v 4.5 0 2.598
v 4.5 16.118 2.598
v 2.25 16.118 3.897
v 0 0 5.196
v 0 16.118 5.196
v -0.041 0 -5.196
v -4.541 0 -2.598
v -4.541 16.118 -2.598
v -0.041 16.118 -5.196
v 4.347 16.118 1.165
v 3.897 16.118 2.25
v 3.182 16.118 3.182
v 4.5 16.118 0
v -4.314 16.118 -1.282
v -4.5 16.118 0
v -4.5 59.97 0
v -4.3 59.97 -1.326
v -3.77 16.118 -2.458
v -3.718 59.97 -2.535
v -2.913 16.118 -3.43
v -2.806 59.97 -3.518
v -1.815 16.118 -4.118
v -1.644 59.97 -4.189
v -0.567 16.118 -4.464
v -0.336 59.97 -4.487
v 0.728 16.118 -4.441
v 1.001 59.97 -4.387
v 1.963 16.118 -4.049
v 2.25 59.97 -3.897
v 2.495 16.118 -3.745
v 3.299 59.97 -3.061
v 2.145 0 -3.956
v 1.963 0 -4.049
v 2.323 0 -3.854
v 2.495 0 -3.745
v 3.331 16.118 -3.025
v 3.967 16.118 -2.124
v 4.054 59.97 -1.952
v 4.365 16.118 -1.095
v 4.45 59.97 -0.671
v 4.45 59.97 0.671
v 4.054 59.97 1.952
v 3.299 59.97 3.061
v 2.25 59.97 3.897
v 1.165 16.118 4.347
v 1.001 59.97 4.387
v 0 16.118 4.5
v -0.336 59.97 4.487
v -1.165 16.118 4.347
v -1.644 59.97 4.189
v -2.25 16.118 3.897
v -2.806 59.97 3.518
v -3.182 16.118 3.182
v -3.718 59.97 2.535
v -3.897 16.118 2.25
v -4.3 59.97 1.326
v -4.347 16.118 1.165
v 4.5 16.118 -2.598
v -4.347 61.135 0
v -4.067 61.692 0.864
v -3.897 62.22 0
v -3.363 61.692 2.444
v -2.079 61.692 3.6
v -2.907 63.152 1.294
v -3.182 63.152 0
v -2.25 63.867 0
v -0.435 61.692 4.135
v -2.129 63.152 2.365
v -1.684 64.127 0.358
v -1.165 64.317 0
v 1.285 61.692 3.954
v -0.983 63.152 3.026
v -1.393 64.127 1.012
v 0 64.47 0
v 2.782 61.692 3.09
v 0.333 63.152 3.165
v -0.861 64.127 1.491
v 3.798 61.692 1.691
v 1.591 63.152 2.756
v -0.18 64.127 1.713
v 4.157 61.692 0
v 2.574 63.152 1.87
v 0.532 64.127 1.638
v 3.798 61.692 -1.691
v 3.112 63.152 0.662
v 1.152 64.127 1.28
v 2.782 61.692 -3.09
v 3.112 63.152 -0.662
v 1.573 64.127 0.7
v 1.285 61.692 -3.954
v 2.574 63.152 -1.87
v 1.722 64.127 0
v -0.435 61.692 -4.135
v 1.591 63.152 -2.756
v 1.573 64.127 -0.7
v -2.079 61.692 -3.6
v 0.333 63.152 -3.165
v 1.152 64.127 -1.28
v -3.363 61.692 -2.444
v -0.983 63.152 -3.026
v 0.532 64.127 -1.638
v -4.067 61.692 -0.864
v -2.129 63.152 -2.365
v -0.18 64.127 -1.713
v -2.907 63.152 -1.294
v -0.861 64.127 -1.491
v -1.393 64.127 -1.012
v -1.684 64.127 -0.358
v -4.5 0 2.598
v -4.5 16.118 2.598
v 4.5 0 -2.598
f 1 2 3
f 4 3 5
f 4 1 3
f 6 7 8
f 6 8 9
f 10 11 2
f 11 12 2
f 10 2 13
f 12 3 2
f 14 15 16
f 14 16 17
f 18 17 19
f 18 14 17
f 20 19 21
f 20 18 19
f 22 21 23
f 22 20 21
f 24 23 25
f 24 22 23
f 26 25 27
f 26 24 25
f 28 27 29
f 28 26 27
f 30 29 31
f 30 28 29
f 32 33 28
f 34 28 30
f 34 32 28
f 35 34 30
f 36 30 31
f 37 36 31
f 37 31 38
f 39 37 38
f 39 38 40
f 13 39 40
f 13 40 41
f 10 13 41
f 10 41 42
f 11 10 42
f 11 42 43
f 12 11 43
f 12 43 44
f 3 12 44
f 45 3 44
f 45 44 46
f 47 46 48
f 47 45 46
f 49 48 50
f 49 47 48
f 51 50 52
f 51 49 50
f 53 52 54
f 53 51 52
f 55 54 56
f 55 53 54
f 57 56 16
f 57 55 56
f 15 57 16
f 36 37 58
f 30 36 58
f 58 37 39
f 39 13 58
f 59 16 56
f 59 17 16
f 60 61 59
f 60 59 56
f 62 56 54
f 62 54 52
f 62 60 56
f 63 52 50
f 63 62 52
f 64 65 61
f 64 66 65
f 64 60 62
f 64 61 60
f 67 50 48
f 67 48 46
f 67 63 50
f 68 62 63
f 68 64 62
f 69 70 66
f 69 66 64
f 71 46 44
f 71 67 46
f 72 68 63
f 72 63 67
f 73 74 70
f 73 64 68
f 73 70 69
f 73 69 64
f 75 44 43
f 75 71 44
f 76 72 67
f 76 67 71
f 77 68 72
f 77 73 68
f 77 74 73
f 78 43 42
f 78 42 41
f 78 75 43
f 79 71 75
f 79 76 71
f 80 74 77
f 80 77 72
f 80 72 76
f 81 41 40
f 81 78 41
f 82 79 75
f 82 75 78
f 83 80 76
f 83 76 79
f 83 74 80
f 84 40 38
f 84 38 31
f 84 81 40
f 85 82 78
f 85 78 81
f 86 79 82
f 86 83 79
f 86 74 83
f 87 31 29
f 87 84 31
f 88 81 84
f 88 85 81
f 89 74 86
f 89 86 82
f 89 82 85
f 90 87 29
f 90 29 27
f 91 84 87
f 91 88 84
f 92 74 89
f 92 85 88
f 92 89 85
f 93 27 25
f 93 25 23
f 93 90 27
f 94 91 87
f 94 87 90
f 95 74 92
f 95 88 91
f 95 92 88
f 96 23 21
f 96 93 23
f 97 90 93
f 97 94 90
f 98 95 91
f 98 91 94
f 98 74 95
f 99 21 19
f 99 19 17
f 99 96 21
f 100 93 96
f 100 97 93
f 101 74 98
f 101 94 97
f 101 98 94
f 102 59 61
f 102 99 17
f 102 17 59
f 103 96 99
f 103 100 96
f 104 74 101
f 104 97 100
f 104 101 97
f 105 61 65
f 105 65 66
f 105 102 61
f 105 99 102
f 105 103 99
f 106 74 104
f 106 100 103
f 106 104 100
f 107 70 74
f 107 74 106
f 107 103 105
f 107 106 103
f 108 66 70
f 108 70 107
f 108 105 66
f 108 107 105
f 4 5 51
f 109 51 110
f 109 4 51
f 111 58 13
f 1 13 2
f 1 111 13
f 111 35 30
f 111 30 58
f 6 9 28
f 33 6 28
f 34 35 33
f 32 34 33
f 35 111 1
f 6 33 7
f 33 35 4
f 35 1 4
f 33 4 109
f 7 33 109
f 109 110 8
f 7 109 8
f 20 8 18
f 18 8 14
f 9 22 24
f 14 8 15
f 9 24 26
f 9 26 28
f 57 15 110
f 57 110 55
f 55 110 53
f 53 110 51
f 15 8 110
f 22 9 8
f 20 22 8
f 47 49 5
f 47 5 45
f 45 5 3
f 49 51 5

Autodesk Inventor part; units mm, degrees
ref_plane "YZ Plane" through (0, 0, 0) normal (1, 0, 0) x (0, 1, 0)
sketch "Boceto1" plane through (0, 0, 0) normal (0, 1, 0) x (-1, 0, 0)
  circle A0 centre (0, 0) radius 4.5
  dimension "d0" = 9
extrude "Extrusión1" add sketch "Boceto1" along normal blind 64.47
fillet "Empalme1" radius 4.5 1 edges at (4.5, 64.47, 0)
sketch "Boceto2" plane through (0, 0, 0) normal (0, -1, 0) x (1, 0, 0)
  circle A0 centre (0, 0) radius 4.5 projected
  circle A1 centre (0, 0) radius 4.5 projected
  line L0 (3.8723, -2.2357) -> (3.8971, -2.25)
  line L1 (0, 0) -> (5.1962, 0) construction
  line L2 (4.5, -2.5981) -> (4.5, 2.5981)
  line L3 (0, 0) -> (5.1962, 0) construction
  line L4 (4.5, 2.5981) -> (0, 5.1958)
  line L5 (0, 5.1958) -> (-4.5, 2.5981)
  line L6 (-4.5, 2.5981) -> (-4.5409, -2.5978)
  line L7 (-4.5409, -2.5978) -> (-0.0409, -5.1955)
  line L8 (-0.0409, -5.1955) -> (4.5, -2.5981)
  dimension "d9" = 30
  dimension "d11" = 5.196
  dimension "d12" = 5.196
  dimension "d13" = 5.196
  dimension "d14" = 5.196
extrude "Extrusión2" add sketch "Boceto2" against normal blind 16.1175 contours A0 L8 | A0 L2 L8 | A0 L4 L2 | A0 L5 L4 | L8 L7 L6 L5 A0 picked at (-2.0247, -0.1583)
ref_plane "Plano de trabajo1" through (-2.2861, 0, 1.3081) normal (-0.5, 0, -0.8661) x (-0.8661, 0, 0.5)
ref_plane "Plano de trabajo2" through (4.5, 0, -2.5981) normal (0.5, 0, 0.866) x (0, 1, 0)
properties part number "antena"
